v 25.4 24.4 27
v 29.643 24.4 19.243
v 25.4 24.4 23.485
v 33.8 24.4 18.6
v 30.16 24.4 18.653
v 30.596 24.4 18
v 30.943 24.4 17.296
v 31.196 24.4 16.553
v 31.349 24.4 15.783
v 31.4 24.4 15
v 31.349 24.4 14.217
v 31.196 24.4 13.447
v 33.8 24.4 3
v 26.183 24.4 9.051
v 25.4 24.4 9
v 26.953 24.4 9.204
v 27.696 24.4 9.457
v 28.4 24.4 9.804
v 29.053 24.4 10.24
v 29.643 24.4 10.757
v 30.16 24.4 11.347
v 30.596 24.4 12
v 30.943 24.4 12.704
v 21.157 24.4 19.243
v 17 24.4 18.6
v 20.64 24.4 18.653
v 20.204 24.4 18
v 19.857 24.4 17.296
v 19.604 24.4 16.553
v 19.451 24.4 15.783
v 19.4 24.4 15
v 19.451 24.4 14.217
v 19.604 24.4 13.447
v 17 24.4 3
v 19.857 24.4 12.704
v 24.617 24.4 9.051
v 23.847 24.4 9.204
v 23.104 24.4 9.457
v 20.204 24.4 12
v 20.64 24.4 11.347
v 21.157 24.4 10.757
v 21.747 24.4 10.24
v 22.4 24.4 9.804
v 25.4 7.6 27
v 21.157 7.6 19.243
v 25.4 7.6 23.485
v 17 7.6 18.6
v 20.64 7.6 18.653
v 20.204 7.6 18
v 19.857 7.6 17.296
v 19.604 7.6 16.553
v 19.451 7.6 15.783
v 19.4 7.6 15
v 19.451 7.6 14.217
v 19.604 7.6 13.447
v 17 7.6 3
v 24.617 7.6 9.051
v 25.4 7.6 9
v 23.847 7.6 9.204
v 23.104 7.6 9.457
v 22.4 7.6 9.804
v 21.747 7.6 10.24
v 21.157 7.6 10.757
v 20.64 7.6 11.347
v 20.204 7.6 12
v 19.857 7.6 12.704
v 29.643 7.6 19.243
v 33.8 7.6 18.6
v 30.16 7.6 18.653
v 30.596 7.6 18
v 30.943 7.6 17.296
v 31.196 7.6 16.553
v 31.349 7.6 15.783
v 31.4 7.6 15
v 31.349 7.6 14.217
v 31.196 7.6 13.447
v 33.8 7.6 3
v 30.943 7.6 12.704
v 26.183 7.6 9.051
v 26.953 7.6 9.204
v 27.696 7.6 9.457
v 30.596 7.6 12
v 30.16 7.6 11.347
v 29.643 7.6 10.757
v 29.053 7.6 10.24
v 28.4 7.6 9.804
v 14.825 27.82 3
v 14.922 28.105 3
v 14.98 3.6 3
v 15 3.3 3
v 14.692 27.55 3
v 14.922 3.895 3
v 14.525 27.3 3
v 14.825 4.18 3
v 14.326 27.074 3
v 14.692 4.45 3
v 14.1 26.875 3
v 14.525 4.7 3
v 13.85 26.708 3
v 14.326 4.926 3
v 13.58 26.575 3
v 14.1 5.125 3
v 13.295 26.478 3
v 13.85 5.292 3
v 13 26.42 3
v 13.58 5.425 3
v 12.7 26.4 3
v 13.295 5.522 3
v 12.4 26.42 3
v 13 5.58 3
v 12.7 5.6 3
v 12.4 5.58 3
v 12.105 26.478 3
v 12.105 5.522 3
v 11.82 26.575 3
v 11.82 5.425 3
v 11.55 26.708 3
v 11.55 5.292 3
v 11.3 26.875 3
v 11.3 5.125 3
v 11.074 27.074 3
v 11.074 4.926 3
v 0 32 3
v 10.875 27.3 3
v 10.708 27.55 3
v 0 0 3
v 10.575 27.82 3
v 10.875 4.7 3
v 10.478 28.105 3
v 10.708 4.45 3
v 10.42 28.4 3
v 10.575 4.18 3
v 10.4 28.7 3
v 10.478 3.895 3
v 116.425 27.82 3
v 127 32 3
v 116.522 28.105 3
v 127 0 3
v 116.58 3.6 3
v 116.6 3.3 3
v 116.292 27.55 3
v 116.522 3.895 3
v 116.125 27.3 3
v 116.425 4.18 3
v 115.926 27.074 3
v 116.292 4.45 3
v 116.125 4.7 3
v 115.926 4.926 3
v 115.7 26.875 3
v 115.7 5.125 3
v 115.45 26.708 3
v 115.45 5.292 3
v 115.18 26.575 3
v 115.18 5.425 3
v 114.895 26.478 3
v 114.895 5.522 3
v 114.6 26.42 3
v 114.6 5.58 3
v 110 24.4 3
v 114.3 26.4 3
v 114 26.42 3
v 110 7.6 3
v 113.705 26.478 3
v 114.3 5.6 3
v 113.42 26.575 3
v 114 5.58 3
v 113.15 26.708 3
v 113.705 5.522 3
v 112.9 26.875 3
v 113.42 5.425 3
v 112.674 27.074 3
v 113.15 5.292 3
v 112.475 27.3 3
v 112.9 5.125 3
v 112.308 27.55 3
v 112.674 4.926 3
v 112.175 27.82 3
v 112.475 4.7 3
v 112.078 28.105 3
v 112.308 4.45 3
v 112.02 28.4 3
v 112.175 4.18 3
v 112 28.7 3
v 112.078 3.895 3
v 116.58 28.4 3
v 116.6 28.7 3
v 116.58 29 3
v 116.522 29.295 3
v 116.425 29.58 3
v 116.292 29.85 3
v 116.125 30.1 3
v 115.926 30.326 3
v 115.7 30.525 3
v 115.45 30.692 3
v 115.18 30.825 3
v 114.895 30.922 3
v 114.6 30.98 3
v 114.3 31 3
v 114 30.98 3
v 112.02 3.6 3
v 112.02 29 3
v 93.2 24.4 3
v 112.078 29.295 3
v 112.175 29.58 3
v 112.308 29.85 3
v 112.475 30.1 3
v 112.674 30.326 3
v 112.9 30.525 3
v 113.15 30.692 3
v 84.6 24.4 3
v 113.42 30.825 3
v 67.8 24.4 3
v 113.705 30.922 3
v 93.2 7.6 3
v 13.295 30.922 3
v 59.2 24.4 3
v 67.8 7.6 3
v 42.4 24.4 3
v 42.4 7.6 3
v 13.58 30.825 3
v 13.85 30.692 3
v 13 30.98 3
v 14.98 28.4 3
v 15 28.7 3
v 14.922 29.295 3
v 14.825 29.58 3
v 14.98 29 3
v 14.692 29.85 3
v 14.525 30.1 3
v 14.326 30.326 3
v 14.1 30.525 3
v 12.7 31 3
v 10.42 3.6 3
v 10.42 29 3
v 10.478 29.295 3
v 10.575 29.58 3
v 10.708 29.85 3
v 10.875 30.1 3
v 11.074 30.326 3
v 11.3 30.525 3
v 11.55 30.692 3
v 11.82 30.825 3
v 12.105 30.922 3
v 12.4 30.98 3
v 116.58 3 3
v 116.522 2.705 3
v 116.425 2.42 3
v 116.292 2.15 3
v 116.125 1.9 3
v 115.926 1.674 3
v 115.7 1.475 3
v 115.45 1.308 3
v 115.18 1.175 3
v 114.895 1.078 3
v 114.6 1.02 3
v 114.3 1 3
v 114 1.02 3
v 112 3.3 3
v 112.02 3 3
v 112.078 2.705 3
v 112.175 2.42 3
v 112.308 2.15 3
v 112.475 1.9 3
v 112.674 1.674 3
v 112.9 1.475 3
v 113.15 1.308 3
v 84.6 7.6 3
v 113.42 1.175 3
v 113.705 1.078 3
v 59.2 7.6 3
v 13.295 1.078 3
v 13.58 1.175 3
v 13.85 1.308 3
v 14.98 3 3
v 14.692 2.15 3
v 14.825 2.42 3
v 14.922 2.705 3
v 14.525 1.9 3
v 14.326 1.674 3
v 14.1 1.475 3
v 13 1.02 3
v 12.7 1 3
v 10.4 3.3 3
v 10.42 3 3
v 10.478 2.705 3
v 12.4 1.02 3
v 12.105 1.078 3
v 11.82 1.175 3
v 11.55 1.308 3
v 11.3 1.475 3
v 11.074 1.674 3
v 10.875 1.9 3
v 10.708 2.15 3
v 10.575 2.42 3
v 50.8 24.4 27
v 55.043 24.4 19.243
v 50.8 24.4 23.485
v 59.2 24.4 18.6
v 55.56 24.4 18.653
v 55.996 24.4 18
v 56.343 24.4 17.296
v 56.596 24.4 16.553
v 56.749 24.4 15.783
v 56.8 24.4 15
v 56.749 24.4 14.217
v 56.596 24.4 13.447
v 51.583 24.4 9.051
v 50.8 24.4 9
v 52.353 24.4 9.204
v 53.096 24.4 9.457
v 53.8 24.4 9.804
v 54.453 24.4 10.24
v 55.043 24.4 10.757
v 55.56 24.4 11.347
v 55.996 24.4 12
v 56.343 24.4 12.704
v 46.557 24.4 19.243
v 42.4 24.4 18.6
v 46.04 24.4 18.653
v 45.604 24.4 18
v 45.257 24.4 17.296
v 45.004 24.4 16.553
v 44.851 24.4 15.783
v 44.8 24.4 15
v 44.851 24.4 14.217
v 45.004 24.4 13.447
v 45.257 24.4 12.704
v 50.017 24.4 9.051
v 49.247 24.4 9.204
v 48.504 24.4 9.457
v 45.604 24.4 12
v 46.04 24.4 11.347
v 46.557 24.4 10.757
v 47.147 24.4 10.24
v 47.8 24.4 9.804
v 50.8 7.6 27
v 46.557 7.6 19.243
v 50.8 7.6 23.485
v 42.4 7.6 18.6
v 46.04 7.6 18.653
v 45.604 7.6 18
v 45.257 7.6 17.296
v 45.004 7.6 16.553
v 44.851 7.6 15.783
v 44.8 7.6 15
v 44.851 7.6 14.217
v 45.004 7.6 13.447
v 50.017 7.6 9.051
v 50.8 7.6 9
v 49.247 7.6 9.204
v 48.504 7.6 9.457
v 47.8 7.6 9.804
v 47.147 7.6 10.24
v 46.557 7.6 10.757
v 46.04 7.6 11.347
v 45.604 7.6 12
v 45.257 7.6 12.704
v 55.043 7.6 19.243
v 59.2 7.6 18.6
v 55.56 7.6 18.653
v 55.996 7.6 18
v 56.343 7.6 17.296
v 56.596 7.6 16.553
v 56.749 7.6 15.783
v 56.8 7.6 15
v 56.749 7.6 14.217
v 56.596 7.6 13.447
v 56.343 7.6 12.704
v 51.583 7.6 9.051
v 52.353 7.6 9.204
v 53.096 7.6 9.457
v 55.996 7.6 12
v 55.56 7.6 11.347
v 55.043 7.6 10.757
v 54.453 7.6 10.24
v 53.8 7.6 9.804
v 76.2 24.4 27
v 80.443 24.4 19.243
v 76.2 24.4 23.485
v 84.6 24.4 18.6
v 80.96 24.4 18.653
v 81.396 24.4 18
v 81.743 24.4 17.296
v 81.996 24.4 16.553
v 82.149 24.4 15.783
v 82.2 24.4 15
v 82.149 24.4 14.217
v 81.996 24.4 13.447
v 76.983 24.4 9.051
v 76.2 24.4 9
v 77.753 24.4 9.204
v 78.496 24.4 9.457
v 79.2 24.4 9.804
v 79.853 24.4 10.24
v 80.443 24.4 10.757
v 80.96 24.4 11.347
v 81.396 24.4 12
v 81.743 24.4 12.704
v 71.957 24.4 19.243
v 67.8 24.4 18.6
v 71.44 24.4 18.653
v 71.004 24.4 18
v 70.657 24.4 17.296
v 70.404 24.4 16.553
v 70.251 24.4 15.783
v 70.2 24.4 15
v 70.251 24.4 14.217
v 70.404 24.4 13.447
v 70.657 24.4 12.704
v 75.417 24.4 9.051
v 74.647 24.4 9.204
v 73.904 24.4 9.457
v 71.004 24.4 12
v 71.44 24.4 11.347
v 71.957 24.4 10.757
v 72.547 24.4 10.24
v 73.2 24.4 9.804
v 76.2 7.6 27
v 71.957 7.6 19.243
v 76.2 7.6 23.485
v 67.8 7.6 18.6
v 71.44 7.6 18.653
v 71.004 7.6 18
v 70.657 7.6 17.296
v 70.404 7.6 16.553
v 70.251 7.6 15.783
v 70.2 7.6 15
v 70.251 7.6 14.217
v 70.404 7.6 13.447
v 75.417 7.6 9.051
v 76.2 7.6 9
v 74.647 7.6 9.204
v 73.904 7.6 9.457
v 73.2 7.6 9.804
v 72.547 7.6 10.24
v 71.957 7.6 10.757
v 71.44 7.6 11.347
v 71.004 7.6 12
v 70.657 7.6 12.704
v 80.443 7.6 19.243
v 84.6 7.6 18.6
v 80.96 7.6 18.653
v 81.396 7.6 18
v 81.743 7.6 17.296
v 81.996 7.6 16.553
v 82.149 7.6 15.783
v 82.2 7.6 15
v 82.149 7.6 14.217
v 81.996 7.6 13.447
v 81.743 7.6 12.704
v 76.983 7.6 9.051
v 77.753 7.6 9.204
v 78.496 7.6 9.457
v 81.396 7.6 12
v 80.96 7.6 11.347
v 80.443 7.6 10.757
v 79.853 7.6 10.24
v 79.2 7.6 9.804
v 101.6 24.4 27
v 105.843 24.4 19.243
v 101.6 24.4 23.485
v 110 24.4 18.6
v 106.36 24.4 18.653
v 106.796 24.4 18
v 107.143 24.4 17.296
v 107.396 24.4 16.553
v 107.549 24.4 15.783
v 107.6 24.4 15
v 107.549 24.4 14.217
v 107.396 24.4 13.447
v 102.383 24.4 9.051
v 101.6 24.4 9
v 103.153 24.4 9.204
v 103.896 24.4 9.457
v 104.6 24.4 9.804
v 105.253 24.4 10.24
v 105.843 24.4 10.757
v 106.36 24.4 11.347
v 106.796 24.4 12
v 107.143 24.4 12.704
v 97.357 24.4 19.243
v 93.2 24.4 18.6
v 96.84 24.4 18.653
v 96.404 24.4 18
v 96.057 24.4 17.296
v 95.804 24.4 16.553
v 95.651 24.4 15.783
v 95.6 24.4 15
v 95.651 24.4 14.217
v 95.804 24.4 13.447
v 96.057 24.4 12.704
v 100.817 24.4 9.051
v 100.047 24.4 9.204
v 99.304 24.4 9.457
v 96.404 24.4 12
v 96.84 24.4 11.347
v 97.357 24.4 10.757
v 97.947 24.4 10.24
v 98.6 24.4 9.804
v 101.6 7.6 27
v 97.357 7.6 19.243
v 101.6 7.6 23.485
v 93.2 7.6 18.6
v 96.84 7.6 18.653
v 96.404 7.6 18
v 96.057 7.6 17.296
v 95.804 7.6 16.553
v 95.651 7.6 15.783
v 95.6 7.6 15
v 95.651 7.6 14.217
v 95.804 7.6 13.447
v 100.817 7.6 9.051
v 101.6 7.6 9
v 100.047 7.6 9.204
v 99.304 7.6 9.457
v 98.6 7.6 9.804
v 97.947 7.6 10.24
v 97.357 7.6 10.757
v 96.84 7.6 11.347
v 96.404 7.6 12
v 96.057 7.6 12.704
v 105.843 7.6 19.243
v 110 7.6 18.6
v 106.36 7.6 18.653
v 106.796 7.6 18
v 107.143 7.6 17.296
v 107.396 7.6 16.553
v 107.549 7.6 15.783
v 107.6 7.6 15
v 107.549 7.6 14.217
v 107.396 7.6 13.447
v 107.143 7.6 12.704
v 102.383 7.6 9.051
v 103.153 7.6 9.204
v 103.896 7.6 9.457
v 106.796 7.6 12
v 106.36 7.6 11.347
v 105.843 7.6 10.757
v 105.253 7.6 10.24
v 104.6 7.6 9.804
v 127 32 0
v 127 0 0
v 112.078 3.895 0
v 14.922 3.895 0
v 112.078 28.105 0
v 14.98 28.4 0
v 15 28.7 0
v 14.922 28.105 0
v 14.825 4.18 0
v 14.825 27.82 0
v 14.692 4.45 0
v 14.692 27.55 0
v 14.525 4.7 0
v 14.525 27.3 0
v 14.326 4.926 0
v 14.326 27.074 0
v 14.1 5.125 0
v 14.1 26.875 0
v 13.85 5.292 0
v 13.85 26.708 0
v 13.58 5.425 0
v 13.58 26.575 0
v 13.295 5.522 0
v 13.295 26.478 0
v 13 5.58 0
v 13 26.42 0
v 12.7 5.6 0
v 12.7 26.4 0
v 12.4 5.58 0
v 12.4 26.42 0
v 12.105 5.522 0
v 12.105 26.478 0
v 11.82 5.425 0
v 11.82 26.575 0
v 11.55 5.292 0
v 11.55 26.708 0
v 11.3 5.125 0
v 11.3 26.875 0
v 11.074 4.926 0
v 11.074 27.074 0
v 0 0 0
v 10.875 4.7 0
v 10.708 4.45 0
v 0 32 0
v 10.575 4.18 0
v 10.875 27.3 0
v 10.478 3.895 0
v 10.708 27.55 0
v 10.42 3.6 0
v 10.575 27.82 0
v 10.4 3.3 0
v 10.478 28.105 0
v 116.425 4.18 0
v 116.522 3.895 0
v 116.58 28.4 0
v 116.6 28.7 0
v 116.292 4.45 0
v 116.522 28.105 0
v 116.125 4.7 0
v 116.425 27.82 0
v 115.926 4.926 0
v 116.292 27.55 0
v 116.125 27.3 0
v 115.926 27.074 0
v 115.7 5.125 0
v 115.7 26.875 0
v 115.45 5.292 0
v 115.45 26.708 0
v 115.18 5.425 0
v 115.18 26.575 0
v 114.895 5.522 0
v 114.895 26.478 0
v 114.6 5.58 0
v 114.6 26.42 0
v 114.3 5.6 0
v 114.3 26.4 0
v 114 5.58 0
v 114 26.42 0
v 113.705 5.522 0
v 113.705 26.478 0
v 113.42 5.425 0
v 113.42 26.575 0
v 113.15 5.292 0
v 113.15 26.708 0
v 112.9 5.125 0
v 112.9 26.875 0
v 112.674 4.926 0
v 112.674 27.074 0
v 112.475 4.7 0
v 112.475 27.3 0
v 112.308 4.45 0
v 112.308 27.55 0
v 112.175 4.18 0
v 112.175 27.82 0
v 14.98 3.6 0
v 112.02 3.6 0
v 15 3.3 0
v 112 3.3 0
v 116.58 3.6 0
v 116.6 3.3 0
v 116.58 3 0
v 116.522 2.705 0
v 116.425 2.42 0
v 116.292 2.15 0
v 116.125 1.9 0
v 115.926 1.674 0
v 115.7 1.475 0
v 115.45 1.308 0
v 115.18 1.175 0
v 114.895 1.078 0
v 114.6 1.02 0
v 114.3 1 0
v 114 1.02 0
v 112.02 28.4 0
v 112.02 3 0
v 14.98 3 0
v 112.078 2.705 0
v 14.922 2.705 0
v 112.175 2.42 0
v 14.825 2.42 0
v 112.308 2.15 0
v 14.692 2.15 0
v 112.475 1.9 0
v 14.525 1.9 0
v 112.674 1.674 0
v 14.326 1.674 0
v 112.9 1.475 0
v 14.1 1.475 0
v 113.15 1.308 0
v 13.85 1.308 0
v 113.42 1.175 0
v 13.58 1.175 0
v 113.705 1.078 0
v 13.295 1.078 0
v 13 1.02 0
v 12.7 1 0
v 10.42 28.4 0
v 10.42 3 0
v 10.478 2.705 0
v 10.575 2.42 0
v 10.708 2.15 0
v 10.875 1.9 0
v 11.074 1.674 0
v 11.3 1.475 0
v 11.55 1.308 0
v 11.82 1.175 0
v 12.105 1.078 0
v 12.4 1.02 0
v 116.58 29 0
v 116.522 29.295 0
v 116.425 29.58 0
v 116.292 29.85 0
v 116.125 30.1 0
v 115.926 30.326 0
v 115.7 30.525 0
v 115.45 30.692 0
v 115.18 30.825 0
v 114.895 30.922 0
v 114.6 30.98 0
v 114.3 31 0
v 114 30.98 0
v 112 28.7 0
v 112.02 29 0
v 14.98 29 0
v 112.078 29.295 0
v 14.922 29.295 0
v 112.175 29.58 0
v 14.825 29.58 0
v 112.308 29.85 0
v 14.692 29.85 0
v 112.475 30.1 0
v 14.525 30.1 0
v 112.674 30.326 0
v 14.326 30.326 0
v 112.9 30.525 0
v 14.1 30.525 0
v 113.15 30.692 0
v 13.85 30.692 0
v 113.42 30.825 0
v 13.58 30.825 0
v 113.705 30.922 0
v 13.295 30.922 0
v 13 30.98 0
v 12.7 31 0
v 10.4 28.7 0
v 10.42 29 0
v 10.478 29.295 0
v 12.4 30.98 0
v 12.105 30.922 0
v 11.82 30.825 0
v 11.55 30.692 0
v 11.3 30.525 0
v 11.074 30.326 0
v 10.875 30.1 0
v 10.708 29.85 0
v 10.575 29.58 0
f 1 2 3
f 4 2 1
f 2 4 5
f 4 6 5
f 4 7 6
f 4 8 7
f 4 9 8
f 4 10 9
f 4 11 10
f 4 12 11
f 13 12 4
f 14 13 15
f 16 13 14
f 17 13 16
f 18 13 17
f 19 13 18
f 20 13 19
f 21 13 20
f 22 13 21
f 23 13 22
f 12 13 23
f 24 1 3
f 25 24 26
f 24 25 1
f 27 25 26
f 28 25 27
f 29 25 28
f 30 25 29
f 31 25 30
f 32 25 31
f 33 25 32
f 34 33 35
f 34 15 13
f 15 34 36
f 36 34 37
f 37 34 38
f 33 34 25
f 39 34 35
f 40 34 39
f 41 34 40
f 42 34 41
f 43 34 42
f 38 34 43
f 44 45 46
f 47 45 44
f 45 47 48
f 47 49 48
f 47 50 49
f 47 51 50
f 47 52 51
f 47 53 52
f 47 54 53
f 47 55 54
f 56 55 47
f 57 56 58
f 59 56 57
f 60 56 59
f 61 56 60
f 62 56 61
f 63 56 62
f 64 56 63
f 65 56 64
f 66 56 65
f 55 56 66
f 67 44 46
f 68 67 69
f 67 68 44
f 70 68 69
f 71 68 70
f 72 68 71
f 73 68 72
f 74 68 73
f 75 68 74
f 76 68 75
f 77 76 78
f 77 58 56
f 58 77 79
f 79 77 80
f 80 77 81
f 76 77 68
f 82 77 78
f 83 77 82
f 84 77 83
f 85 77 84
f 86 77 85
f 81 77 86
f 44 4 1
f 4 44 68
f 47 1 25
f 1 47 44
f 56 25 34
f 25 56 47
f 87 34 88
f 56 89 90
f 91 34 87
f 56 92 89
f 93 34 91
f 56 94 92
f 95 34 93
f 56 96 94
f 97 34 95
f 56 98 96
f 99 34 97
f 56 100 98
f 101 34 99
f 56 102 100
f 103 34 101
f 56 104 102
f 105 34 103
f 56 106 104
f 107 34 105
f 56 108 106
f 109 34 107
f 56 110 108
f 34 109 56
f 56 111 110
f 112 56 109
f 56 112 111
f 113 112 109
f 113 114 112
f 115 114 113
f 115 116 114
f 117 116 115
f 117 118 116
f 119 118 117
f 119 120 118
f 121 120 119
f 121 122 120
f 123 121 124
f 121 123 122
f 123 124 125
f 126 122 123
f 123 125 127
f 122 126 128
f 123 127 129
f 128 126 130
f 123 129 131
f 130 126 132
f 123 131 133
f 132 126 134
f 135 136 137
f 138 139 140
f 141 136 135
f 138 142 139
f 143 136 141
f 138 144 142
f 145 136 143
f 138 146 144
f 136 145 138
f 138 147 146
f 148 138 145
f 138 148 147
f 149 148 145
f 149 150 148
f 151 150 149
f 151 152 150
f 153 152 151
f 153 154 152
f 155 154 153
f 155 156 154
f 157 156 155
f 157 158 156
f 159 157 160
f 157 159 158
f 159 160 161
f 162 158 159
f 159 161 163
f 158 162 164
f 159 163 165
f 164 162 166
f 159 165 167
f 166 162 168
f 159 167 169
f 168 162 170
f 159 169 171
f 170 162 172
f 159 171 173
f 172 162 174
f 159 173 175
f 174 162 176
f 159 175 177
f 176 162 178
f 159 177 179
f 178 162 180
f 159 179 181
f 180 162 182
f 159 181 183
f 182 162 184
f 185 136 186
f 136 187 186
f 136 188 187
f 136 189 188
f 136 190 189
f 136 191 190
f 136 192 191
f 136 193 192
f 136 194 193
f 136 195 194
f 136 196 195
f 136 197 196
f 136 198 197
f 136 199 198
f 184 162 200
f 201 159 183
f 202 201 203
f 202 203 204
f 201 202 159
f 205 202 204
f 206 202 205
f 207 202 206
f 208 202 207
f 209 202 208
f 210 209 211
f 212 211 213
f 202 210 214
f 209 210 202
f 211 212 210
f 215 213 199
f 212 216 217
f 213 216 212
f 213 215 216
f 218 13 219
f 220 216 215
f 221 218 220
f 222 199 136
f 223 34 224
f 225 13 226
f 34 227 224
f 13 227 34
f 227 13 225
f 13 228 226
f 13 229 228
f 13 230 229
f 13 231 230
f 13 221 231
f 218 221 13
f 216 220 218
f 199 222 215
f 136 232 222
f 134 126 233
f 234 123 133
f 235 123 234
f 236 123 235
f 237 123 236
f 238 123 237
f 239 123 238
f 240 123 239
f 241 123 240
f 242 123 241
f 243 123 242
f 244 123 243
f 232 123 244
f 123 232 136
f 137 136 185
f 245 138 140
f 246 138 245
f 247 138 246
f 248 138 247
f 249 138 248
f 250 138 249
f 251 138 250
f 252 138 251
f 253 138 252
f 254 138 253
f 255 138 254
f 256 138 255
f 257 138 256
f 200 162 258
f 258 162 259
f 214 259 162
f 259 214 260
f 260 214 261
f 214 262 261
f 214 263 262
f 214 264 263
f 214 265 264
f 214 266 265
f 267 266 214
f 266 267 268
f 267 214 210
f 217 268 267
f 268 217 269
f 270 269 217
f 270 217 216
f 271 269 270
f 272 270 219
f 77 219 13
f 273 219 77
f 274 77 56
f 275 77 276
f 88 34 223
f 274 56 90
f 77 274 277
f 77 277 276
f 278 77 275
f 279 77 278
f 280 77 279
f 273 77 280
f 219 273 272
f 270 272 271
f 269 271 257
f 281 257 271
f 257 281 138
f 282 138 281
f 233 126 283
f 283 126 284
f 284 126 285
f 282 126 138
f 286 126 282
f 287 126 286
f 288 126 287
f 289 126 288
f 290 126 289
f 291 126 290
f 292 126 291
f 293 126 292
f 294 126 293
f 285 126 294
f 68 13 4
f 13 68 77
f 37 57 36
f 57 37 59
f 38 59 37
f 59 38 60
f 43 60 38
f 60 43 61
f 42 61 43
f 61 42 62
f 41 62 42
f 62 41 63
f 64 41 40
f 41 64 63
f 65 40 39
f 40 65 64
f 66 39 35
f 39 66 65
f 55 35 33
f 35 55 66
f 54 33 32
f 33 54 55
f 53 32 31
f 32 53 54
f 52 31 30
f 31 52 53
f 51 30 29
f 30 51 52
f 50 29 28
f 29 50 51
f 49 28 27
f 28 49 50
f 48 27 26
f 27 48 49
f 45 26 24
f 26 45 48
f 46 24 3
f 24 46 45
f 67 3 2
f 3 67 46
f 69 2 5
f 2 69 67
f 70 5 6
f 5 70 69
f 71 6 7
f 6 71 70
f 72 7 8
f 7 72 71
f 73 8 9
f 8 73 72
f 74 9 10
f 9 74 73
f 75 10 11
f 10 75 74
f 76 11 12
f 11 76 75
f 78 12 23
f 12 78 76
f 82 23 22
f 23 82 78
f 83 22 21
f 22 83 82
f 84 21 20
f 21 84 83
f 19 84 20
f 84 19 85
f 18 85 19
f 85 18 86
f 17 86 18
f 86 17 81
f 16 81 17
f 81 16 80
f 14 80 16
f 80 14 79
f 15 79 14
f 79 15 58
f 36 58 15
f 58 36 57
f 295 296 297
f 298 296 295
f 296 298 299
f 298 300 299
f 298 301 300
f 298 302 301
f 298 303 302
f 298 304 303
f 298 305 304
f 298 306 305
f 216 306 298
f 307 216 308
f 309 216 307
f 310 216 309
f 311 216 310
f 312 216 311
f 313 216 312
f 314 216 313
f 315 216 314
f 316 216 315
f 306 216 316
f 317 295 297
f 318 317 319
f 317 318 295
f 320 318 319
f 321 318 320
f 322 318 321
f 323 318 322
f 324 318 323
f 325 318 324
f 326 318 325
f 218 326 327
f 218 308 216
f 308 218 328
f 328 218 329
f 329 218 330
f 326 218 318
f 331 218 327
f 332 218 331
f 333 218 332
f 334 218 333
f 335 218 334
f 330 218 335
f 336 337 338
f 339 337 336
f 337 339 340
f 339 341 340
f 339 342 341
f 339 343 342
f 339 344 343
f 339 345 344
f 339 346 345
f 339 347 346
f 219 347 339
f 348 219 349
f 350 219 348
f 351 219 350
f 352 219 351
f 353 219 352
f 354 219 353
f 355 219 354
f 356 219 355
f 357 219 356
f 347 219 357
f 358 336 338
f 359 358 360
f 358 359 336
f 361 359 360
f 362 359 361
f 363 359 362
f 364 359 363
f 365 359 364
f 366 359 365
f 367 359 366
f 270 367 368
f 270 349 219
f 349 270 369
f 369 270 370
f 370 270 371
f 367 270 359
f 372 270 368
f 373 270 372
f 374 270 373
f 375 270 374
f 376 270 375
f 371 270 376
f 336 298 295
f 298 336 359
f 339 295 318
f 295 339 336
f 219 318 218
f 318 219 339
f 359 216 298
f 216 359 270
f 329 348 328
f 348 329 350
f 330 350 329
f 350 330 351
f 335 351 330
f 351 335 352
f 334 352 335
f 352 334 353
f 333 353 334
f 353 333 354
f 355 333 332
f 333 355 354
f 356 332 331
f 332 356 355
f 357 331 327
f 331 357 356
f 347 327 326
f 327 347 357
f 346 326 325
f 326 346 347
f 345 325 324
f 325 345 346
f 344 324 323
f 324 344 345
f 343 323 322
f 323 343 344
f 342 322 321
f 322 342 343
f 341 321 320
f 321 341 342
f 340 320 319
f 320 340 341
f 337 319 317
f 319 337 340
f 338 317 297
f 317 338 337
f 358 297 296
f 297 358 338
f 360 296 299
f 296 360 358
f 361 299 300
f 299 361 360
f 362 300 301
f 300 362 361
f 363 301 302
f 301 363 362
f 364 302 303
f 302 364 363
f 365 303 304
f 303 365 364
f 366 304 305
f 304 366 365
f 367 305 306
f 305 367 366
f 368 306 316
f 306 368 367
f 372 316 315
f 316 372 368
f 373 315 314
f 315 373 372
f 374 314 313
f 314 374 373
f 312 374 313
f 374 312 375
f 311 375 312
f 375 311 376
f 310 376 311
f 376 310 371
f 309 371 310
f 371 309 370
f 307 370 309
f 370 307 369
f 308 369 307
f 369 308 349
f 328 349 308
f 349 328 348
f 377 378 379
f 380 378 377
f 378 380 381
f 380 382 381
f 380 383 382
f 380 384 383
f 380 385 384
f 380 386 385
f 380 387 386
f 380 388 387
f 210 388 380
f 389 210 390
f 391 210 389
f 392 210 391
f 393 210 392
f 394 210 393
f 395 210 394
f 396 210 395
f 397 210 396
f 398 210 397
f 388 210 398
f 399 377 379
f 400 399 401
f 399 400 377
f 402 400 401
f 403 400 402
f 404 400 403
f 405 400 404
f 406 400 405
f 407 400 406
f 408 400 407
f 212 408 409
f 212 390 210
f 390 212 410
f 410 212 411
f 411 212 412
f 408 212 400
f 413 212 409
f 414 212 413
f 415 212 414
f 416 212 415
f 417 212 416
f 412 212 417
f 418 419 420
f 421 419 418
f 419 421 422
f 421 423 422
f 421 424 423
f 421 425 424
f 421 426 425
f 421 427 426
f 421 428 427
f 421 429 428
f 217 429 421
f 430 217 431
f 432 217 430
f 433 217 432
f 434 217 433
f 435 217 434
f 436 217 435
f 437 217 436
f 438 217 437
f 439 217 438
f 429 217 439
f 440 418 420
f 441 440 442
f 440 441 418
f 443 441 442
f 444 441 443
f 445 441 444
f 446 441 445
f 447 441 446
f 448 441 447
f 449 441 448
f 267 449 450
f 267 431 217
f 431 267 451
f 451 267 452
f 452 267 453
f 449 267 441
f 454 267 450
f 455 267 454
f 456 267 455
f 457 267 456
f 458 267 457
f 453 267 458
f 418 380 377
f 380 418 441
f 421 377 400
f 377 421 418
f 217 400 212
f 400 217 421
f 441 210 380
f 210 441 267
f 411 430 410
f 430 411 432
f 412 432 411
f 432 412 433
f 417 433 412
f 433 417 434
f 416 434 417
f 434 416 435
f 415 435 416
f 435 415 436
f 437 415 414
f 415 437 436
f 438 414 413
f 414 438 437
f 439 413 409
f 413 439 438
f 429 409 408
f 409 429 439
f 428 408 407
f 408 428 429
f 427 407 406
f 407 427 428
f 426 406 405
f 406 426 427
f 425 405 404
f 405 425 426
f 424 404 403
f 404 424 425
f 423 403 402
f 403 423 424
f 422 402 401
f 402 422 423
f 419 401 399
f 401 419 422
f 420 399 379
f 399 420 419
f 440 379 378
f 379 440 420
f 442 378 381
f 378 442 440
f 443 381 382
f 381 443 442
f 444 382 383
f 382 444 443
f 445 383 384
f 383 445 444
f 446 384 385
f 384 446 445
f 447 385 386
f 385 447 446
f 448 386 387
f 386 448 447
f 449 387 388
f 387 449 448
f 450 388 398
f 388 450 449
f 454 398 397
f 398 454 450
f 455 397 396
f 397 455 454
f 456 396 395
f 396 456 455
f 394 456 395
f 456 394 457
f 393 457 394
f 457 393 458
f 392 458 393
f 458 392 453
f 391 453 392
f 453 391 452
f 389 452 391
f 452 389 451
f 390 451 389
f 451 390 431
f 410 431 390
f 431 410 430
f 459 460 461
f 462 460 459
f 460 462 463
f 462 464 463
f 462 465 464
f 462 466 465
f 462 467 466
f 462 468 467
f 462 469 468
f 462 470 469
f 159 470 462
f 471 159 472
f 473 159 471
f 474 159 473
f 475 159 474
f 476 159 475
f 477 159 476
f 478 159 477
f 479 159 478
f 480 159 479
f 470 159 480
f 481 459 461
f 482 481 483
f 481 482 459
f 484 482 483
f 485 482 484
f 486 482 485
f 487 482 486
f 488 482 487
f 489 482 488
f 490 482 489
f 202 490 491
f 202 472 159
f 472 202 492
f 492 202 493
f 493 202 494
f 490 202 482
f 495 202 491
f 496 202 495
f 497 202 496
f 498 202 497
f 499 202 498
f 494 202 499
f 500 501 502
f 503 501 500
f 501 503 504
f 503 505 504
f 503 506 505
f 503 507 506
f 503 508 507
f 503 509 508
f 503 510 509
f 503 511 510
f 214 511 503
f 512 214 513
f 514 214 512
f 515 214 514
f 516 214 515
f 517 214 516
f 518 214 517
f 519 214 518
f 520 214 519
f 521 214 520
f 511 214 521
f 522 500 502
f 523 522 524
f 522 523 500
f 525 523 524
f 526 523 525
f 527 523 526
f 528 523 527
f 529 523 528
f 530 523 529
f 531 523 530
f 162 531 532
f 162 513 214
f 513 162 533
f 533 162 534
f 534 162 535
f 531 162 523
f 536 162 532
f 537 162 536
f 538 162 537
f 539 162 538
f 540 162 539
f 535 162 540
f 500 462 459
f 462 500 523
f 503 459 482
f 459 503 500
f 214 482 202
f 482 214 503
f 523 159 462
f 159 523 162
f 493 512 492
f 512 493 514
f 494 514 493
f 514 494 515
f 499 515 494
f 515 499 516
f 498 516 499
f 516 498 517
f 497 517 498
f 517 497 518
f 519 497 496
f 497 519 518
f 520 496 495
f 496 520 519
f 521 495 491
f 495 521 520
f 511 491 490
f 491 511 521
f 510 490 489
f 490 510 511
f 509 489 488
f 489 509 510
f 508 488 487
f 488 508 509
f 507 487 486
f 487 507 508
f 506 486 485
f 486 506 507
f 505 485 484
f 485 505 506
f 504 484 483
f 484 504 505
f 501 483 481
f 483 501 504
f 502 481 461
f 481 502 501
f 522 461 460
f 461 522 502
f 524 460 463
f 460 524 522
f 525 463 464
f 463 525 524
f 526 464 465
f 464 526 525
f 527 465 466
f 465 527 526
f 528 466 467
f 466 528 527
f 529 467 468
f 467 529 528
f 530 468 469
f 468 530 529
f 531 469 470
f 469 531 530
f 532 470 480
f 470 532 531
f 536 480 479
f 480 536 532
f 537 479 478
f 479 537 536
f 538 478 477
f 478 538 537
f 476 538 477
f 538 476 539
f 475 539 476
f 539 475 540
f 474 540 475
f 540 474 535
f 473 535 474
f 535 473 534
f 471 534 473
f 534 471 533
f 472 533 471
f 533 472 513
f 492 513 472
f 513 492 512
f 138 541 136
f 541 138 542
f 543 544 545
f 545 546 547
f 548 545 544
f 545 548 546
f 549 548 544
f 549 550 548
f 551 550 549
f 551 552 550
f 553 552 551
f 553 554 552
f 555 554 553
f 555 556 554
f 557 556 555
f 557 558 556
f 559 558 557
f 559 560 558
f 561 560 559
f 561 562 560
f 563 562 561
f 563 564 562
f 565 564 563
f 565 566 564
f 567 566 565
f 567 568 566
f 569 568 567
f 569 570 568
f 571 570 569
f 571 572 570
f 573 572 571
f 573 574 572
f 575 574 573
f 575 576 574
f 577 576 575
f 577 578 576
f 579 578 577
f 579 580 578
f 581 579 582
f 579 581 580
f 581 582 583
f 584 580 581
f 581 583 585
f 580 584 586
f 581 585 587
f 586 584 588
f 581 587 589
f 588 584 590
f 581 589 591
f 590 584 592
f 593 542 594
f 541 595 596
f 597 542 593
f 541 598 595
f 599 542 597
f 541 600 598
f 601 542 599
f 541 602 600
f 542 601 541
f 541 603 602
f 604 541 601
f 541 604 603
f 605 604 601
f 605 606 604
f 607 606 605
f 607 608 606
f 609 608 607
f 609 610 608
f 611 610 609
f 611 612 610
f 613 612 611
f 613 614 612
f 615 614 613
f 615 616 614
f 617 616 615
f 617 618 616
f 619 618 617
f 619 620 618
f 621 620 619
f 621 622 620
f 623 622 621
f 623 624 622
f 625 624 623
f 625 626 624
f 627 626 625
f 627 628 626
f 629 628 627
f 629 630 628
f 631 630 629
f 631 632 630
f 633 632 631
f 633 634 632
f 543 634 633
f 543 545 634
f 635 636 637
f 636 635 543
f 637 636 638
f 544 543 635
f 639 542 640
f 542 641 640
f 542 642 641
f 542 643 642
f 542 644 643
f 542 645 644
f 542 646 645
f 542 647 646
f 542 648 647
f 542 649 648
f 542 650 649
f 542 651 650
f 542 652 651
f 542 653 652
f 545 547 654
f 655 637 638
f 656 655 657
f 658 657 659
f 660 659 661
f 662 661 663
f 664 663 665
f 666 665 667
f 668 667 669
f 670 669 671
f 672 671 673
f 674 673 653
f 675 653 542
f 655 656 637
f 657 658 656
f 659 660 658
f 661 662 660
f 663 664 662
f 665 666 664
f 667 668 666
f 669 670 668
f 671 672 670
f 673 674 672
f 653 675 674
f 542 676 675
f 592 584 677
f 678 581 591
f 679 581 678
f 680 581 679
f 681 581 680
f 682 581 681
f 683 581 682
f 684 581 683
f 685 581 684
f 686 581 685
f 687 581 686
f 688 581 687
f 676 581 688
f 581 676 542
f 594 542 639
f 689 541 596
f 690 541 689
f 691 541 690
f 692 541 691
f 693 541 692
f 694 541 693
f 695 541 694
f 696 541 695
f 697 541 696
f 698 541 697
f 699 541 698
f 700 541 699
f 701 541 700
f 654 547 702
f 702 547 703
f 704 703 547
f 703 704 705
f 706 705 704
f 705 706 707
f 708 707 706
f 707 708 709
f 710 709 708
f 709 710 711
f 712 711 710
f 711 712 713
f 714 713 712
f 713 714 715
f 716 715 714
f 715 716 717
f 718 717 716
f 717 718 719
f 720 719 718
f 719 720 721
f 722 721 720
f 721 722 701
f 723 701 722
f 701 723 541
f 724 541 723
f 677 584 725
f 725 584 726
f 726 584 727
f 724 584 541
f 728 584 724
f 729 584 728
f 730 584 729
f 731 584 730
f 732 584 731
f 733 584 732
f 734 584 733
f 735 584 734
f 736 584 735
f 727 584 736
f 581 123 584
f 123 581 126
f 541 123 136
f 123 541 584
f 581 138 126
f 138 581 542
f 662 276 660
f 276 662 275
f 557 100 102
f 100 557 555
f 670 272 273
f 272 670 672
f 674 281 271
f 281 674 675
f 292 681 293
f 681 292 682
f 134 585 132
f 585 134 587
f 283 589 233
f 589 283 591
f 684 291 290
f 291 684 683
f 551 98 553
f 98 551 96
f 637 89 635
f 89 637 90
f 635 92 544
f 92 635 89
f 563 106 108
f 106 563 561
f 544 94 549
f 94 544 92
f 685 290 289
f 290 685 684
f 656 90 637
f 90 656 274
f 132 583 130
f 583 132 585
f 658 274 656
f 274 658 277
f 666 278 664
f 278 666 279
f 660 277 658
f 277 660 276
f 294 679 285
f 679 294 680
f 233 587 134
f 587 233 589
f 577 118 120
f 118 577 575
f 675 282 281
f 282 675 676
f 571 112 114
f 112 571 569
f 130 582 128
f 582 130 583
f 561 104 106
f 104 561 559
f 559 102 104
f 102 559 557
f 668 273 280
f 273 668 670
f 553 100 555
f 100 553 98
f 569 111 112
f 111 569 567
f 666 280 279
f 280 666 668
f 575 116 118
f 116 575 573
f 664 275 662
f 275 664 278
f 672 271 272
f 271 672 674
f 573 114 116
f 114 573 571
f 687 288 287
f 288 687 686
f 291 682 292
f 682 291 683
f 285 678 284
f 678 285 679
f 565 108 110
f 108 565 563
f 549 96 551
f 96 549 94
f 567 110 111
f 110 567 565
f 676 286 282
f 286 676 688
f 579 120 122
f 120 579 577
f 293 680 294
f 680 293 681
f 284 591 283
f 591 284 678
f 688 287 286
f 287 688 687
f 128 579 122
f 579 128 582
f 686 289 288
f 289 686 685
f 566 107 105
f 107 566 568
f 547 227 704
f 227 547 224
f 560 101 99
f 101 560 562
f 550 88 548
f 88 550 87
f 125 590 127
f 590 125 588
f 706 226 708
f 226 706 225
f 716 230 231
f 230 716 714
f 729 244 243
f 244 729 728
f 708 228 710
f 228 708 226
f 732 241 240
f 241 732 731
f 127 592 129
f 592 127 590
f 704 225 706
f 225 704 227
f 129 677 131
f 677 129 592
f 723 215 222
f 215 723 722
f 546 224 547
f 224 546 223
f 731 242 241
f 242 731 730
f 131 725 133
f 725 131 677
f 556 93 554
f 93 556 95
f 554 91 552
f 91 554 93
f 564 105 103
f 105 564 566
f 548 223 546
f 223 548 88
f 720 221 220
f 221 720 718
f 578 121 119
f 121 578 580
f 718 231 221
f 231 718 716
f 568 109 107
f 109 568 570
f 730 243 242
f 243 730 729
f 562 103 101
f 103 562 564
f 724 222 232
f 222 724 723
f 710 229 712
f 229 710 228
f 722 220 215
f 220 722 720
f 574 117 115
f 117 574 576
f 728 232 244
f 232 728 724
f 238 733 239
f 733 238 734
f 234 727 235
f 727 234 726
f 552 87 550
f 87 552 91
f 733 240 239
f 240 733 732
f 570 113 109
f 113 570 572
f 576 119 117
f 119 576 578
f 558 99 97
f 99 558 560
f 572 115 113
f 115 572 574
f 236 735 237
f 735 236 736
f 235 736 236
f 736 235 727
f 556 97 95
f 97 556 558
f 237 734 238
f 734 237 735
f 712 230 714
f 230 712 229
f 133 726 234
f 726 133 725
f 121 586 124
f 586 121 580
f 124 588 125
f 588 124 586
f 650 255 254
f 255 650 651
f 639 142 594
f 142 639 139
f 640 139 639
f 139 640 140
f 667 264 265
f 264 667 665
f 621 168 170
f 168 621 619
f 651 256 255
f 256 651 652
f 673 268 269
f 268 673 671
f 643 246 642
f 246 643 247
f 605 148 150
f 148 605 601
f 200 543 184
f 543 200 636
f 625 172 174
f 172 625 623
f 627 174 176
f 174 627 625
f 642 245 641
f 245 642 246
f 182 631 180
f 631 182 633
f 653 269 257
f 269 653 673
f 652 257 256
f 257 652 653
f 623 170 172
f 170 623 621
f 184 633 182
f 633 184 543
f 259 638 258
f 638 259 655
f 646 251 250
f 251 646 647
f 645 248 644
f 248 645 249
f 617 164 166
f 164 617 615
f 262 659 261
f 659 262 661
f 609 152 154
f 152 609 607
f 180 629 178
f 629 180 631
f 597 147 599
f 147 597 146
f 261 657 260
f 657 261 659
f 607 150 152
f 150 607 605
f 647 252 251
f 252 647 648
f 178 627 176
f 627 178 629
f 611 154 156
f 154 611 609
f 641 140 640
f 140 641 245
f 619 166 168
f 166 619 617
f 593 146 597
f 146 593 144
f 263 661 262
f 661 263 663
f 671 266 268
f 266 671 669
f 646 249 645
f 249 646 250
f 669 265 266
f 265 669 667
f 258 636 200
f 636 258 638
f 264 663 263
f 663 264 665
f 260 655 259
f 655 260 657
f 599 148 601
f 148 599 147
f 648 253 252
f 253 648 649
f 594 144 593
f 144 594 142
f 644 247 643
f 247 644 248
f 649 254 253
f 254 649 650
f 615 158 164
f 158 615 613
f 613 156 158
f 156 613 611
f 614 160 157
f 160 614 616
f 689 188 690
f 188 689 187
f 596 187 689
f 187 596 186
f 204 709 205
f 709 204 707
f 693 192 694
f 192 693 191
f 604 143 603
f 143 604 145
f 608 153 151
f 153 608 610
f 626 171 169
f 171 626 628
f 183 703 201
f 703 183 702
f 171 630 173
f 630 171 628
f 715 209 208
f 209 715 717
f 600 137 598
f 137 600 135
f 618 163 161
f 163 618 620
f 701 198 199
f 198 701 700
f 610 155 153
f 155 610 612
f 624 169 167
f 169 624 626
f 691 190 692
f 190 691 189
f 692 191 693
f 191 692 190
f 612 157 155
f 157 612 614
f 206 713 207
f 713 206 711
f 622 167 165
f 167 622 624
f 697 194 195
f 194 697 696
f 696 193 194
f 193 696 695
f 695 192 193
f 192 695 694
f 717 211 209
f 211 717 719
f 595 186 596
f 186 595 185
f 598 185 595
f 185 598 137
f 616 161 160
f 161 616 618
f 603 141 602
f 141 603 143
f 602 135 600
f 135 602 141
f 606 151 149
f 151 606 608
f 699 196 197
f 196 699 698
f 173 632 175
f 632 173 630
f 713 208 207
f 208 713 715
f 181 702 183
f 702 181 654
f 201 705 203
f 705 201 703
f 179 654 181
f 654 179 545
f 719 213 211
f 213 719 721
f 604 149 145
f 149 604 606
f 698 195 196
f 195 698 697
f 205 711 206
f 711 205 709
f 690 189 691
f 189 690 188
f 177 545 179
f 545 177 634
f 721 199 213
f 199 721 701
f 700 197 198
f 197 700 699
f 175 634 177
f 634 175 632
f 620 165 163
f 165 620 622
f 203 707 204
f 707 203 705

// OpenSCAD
// Four-tool rack for 25.4 mm pegboard; print with the rear plate on the bed.
// Attach with M4 bolts and washers through the pegboard, then insert drivers.
tool_count = 4; // Number of tool sockets [2:1:6]
tool_spacing = 25.4; // Socket and peg pitch, mm [20:0.2:30]
socket_diameter = 12; // Clear tool-shaft bore, mm [8:1:16]
plate_height = 32; // Backplate height, mm [28:1:45]
plate_thickness = 3; // Backplate thickness, mm [2:0.2:5]
socket_depth = 24; // Projection from pegboard, mm [24:1:32]
socket_wall = 2.4; // Material around socket, mm [1.6:0.2:4]
bolt_diameter = 4.6; // M4 clearance, mm [4.4:0.1:5]
$fn = 48; // Circular resolution
cut_extra = 1; // Cutter overlap, mm
plate_width = (tool_count+1)*tool_spacing; // Derived plate width, mm
socket_outer = socket_diameter/2+socket_wall; // Derived radius, mm

module tool_socket(x) {
    // Bores run across the plate: their pointed roofs rise at 45 degrees.
    translate([x,plate_height/2,plate_thickness])
        rotate([90,0,0]) linear_extrude(2*socket_outer,center=true)
            difference() {
                polygon([[-socket_outer,0],[socket_outer,0],
                         [socket_outer,socket_depth-socket_outer],
                         [0,socket_depth],
                         [-socket_outer,socket_depth-socket_outer]]);
                translate([0,socket_depth/2])
                    union() {
                        circle(d=socket_diameter);
                        polygon([[-socket_diameter/(2*sqrt(2)),socket_diameter/(2*sqrt(2))],
                                 [0,socket_diameter/sqrt(2)],
                                 [socket_diameter/(2*sqrt(2)),socket_diameter/(2*sqrt(2))]]);
                    }
            }
}

difference() {
    union() {
        cube([plate_width,plate_height,plate_thickness]);
        for (i=[1:tool_count]) tool_socket(i*tool_spacing);
    }
    for (x=[tool_spacing/2,plate_width-tool_spacing/2])
        for (y=[(plate_height-tool_spacing)/2,(plate_height+tool_spacing)/2])
            translate([x,y,-cut_extra])
                cylinder(h=plate_thickness+2*cut_extra,d=bolt_diameter);
}
